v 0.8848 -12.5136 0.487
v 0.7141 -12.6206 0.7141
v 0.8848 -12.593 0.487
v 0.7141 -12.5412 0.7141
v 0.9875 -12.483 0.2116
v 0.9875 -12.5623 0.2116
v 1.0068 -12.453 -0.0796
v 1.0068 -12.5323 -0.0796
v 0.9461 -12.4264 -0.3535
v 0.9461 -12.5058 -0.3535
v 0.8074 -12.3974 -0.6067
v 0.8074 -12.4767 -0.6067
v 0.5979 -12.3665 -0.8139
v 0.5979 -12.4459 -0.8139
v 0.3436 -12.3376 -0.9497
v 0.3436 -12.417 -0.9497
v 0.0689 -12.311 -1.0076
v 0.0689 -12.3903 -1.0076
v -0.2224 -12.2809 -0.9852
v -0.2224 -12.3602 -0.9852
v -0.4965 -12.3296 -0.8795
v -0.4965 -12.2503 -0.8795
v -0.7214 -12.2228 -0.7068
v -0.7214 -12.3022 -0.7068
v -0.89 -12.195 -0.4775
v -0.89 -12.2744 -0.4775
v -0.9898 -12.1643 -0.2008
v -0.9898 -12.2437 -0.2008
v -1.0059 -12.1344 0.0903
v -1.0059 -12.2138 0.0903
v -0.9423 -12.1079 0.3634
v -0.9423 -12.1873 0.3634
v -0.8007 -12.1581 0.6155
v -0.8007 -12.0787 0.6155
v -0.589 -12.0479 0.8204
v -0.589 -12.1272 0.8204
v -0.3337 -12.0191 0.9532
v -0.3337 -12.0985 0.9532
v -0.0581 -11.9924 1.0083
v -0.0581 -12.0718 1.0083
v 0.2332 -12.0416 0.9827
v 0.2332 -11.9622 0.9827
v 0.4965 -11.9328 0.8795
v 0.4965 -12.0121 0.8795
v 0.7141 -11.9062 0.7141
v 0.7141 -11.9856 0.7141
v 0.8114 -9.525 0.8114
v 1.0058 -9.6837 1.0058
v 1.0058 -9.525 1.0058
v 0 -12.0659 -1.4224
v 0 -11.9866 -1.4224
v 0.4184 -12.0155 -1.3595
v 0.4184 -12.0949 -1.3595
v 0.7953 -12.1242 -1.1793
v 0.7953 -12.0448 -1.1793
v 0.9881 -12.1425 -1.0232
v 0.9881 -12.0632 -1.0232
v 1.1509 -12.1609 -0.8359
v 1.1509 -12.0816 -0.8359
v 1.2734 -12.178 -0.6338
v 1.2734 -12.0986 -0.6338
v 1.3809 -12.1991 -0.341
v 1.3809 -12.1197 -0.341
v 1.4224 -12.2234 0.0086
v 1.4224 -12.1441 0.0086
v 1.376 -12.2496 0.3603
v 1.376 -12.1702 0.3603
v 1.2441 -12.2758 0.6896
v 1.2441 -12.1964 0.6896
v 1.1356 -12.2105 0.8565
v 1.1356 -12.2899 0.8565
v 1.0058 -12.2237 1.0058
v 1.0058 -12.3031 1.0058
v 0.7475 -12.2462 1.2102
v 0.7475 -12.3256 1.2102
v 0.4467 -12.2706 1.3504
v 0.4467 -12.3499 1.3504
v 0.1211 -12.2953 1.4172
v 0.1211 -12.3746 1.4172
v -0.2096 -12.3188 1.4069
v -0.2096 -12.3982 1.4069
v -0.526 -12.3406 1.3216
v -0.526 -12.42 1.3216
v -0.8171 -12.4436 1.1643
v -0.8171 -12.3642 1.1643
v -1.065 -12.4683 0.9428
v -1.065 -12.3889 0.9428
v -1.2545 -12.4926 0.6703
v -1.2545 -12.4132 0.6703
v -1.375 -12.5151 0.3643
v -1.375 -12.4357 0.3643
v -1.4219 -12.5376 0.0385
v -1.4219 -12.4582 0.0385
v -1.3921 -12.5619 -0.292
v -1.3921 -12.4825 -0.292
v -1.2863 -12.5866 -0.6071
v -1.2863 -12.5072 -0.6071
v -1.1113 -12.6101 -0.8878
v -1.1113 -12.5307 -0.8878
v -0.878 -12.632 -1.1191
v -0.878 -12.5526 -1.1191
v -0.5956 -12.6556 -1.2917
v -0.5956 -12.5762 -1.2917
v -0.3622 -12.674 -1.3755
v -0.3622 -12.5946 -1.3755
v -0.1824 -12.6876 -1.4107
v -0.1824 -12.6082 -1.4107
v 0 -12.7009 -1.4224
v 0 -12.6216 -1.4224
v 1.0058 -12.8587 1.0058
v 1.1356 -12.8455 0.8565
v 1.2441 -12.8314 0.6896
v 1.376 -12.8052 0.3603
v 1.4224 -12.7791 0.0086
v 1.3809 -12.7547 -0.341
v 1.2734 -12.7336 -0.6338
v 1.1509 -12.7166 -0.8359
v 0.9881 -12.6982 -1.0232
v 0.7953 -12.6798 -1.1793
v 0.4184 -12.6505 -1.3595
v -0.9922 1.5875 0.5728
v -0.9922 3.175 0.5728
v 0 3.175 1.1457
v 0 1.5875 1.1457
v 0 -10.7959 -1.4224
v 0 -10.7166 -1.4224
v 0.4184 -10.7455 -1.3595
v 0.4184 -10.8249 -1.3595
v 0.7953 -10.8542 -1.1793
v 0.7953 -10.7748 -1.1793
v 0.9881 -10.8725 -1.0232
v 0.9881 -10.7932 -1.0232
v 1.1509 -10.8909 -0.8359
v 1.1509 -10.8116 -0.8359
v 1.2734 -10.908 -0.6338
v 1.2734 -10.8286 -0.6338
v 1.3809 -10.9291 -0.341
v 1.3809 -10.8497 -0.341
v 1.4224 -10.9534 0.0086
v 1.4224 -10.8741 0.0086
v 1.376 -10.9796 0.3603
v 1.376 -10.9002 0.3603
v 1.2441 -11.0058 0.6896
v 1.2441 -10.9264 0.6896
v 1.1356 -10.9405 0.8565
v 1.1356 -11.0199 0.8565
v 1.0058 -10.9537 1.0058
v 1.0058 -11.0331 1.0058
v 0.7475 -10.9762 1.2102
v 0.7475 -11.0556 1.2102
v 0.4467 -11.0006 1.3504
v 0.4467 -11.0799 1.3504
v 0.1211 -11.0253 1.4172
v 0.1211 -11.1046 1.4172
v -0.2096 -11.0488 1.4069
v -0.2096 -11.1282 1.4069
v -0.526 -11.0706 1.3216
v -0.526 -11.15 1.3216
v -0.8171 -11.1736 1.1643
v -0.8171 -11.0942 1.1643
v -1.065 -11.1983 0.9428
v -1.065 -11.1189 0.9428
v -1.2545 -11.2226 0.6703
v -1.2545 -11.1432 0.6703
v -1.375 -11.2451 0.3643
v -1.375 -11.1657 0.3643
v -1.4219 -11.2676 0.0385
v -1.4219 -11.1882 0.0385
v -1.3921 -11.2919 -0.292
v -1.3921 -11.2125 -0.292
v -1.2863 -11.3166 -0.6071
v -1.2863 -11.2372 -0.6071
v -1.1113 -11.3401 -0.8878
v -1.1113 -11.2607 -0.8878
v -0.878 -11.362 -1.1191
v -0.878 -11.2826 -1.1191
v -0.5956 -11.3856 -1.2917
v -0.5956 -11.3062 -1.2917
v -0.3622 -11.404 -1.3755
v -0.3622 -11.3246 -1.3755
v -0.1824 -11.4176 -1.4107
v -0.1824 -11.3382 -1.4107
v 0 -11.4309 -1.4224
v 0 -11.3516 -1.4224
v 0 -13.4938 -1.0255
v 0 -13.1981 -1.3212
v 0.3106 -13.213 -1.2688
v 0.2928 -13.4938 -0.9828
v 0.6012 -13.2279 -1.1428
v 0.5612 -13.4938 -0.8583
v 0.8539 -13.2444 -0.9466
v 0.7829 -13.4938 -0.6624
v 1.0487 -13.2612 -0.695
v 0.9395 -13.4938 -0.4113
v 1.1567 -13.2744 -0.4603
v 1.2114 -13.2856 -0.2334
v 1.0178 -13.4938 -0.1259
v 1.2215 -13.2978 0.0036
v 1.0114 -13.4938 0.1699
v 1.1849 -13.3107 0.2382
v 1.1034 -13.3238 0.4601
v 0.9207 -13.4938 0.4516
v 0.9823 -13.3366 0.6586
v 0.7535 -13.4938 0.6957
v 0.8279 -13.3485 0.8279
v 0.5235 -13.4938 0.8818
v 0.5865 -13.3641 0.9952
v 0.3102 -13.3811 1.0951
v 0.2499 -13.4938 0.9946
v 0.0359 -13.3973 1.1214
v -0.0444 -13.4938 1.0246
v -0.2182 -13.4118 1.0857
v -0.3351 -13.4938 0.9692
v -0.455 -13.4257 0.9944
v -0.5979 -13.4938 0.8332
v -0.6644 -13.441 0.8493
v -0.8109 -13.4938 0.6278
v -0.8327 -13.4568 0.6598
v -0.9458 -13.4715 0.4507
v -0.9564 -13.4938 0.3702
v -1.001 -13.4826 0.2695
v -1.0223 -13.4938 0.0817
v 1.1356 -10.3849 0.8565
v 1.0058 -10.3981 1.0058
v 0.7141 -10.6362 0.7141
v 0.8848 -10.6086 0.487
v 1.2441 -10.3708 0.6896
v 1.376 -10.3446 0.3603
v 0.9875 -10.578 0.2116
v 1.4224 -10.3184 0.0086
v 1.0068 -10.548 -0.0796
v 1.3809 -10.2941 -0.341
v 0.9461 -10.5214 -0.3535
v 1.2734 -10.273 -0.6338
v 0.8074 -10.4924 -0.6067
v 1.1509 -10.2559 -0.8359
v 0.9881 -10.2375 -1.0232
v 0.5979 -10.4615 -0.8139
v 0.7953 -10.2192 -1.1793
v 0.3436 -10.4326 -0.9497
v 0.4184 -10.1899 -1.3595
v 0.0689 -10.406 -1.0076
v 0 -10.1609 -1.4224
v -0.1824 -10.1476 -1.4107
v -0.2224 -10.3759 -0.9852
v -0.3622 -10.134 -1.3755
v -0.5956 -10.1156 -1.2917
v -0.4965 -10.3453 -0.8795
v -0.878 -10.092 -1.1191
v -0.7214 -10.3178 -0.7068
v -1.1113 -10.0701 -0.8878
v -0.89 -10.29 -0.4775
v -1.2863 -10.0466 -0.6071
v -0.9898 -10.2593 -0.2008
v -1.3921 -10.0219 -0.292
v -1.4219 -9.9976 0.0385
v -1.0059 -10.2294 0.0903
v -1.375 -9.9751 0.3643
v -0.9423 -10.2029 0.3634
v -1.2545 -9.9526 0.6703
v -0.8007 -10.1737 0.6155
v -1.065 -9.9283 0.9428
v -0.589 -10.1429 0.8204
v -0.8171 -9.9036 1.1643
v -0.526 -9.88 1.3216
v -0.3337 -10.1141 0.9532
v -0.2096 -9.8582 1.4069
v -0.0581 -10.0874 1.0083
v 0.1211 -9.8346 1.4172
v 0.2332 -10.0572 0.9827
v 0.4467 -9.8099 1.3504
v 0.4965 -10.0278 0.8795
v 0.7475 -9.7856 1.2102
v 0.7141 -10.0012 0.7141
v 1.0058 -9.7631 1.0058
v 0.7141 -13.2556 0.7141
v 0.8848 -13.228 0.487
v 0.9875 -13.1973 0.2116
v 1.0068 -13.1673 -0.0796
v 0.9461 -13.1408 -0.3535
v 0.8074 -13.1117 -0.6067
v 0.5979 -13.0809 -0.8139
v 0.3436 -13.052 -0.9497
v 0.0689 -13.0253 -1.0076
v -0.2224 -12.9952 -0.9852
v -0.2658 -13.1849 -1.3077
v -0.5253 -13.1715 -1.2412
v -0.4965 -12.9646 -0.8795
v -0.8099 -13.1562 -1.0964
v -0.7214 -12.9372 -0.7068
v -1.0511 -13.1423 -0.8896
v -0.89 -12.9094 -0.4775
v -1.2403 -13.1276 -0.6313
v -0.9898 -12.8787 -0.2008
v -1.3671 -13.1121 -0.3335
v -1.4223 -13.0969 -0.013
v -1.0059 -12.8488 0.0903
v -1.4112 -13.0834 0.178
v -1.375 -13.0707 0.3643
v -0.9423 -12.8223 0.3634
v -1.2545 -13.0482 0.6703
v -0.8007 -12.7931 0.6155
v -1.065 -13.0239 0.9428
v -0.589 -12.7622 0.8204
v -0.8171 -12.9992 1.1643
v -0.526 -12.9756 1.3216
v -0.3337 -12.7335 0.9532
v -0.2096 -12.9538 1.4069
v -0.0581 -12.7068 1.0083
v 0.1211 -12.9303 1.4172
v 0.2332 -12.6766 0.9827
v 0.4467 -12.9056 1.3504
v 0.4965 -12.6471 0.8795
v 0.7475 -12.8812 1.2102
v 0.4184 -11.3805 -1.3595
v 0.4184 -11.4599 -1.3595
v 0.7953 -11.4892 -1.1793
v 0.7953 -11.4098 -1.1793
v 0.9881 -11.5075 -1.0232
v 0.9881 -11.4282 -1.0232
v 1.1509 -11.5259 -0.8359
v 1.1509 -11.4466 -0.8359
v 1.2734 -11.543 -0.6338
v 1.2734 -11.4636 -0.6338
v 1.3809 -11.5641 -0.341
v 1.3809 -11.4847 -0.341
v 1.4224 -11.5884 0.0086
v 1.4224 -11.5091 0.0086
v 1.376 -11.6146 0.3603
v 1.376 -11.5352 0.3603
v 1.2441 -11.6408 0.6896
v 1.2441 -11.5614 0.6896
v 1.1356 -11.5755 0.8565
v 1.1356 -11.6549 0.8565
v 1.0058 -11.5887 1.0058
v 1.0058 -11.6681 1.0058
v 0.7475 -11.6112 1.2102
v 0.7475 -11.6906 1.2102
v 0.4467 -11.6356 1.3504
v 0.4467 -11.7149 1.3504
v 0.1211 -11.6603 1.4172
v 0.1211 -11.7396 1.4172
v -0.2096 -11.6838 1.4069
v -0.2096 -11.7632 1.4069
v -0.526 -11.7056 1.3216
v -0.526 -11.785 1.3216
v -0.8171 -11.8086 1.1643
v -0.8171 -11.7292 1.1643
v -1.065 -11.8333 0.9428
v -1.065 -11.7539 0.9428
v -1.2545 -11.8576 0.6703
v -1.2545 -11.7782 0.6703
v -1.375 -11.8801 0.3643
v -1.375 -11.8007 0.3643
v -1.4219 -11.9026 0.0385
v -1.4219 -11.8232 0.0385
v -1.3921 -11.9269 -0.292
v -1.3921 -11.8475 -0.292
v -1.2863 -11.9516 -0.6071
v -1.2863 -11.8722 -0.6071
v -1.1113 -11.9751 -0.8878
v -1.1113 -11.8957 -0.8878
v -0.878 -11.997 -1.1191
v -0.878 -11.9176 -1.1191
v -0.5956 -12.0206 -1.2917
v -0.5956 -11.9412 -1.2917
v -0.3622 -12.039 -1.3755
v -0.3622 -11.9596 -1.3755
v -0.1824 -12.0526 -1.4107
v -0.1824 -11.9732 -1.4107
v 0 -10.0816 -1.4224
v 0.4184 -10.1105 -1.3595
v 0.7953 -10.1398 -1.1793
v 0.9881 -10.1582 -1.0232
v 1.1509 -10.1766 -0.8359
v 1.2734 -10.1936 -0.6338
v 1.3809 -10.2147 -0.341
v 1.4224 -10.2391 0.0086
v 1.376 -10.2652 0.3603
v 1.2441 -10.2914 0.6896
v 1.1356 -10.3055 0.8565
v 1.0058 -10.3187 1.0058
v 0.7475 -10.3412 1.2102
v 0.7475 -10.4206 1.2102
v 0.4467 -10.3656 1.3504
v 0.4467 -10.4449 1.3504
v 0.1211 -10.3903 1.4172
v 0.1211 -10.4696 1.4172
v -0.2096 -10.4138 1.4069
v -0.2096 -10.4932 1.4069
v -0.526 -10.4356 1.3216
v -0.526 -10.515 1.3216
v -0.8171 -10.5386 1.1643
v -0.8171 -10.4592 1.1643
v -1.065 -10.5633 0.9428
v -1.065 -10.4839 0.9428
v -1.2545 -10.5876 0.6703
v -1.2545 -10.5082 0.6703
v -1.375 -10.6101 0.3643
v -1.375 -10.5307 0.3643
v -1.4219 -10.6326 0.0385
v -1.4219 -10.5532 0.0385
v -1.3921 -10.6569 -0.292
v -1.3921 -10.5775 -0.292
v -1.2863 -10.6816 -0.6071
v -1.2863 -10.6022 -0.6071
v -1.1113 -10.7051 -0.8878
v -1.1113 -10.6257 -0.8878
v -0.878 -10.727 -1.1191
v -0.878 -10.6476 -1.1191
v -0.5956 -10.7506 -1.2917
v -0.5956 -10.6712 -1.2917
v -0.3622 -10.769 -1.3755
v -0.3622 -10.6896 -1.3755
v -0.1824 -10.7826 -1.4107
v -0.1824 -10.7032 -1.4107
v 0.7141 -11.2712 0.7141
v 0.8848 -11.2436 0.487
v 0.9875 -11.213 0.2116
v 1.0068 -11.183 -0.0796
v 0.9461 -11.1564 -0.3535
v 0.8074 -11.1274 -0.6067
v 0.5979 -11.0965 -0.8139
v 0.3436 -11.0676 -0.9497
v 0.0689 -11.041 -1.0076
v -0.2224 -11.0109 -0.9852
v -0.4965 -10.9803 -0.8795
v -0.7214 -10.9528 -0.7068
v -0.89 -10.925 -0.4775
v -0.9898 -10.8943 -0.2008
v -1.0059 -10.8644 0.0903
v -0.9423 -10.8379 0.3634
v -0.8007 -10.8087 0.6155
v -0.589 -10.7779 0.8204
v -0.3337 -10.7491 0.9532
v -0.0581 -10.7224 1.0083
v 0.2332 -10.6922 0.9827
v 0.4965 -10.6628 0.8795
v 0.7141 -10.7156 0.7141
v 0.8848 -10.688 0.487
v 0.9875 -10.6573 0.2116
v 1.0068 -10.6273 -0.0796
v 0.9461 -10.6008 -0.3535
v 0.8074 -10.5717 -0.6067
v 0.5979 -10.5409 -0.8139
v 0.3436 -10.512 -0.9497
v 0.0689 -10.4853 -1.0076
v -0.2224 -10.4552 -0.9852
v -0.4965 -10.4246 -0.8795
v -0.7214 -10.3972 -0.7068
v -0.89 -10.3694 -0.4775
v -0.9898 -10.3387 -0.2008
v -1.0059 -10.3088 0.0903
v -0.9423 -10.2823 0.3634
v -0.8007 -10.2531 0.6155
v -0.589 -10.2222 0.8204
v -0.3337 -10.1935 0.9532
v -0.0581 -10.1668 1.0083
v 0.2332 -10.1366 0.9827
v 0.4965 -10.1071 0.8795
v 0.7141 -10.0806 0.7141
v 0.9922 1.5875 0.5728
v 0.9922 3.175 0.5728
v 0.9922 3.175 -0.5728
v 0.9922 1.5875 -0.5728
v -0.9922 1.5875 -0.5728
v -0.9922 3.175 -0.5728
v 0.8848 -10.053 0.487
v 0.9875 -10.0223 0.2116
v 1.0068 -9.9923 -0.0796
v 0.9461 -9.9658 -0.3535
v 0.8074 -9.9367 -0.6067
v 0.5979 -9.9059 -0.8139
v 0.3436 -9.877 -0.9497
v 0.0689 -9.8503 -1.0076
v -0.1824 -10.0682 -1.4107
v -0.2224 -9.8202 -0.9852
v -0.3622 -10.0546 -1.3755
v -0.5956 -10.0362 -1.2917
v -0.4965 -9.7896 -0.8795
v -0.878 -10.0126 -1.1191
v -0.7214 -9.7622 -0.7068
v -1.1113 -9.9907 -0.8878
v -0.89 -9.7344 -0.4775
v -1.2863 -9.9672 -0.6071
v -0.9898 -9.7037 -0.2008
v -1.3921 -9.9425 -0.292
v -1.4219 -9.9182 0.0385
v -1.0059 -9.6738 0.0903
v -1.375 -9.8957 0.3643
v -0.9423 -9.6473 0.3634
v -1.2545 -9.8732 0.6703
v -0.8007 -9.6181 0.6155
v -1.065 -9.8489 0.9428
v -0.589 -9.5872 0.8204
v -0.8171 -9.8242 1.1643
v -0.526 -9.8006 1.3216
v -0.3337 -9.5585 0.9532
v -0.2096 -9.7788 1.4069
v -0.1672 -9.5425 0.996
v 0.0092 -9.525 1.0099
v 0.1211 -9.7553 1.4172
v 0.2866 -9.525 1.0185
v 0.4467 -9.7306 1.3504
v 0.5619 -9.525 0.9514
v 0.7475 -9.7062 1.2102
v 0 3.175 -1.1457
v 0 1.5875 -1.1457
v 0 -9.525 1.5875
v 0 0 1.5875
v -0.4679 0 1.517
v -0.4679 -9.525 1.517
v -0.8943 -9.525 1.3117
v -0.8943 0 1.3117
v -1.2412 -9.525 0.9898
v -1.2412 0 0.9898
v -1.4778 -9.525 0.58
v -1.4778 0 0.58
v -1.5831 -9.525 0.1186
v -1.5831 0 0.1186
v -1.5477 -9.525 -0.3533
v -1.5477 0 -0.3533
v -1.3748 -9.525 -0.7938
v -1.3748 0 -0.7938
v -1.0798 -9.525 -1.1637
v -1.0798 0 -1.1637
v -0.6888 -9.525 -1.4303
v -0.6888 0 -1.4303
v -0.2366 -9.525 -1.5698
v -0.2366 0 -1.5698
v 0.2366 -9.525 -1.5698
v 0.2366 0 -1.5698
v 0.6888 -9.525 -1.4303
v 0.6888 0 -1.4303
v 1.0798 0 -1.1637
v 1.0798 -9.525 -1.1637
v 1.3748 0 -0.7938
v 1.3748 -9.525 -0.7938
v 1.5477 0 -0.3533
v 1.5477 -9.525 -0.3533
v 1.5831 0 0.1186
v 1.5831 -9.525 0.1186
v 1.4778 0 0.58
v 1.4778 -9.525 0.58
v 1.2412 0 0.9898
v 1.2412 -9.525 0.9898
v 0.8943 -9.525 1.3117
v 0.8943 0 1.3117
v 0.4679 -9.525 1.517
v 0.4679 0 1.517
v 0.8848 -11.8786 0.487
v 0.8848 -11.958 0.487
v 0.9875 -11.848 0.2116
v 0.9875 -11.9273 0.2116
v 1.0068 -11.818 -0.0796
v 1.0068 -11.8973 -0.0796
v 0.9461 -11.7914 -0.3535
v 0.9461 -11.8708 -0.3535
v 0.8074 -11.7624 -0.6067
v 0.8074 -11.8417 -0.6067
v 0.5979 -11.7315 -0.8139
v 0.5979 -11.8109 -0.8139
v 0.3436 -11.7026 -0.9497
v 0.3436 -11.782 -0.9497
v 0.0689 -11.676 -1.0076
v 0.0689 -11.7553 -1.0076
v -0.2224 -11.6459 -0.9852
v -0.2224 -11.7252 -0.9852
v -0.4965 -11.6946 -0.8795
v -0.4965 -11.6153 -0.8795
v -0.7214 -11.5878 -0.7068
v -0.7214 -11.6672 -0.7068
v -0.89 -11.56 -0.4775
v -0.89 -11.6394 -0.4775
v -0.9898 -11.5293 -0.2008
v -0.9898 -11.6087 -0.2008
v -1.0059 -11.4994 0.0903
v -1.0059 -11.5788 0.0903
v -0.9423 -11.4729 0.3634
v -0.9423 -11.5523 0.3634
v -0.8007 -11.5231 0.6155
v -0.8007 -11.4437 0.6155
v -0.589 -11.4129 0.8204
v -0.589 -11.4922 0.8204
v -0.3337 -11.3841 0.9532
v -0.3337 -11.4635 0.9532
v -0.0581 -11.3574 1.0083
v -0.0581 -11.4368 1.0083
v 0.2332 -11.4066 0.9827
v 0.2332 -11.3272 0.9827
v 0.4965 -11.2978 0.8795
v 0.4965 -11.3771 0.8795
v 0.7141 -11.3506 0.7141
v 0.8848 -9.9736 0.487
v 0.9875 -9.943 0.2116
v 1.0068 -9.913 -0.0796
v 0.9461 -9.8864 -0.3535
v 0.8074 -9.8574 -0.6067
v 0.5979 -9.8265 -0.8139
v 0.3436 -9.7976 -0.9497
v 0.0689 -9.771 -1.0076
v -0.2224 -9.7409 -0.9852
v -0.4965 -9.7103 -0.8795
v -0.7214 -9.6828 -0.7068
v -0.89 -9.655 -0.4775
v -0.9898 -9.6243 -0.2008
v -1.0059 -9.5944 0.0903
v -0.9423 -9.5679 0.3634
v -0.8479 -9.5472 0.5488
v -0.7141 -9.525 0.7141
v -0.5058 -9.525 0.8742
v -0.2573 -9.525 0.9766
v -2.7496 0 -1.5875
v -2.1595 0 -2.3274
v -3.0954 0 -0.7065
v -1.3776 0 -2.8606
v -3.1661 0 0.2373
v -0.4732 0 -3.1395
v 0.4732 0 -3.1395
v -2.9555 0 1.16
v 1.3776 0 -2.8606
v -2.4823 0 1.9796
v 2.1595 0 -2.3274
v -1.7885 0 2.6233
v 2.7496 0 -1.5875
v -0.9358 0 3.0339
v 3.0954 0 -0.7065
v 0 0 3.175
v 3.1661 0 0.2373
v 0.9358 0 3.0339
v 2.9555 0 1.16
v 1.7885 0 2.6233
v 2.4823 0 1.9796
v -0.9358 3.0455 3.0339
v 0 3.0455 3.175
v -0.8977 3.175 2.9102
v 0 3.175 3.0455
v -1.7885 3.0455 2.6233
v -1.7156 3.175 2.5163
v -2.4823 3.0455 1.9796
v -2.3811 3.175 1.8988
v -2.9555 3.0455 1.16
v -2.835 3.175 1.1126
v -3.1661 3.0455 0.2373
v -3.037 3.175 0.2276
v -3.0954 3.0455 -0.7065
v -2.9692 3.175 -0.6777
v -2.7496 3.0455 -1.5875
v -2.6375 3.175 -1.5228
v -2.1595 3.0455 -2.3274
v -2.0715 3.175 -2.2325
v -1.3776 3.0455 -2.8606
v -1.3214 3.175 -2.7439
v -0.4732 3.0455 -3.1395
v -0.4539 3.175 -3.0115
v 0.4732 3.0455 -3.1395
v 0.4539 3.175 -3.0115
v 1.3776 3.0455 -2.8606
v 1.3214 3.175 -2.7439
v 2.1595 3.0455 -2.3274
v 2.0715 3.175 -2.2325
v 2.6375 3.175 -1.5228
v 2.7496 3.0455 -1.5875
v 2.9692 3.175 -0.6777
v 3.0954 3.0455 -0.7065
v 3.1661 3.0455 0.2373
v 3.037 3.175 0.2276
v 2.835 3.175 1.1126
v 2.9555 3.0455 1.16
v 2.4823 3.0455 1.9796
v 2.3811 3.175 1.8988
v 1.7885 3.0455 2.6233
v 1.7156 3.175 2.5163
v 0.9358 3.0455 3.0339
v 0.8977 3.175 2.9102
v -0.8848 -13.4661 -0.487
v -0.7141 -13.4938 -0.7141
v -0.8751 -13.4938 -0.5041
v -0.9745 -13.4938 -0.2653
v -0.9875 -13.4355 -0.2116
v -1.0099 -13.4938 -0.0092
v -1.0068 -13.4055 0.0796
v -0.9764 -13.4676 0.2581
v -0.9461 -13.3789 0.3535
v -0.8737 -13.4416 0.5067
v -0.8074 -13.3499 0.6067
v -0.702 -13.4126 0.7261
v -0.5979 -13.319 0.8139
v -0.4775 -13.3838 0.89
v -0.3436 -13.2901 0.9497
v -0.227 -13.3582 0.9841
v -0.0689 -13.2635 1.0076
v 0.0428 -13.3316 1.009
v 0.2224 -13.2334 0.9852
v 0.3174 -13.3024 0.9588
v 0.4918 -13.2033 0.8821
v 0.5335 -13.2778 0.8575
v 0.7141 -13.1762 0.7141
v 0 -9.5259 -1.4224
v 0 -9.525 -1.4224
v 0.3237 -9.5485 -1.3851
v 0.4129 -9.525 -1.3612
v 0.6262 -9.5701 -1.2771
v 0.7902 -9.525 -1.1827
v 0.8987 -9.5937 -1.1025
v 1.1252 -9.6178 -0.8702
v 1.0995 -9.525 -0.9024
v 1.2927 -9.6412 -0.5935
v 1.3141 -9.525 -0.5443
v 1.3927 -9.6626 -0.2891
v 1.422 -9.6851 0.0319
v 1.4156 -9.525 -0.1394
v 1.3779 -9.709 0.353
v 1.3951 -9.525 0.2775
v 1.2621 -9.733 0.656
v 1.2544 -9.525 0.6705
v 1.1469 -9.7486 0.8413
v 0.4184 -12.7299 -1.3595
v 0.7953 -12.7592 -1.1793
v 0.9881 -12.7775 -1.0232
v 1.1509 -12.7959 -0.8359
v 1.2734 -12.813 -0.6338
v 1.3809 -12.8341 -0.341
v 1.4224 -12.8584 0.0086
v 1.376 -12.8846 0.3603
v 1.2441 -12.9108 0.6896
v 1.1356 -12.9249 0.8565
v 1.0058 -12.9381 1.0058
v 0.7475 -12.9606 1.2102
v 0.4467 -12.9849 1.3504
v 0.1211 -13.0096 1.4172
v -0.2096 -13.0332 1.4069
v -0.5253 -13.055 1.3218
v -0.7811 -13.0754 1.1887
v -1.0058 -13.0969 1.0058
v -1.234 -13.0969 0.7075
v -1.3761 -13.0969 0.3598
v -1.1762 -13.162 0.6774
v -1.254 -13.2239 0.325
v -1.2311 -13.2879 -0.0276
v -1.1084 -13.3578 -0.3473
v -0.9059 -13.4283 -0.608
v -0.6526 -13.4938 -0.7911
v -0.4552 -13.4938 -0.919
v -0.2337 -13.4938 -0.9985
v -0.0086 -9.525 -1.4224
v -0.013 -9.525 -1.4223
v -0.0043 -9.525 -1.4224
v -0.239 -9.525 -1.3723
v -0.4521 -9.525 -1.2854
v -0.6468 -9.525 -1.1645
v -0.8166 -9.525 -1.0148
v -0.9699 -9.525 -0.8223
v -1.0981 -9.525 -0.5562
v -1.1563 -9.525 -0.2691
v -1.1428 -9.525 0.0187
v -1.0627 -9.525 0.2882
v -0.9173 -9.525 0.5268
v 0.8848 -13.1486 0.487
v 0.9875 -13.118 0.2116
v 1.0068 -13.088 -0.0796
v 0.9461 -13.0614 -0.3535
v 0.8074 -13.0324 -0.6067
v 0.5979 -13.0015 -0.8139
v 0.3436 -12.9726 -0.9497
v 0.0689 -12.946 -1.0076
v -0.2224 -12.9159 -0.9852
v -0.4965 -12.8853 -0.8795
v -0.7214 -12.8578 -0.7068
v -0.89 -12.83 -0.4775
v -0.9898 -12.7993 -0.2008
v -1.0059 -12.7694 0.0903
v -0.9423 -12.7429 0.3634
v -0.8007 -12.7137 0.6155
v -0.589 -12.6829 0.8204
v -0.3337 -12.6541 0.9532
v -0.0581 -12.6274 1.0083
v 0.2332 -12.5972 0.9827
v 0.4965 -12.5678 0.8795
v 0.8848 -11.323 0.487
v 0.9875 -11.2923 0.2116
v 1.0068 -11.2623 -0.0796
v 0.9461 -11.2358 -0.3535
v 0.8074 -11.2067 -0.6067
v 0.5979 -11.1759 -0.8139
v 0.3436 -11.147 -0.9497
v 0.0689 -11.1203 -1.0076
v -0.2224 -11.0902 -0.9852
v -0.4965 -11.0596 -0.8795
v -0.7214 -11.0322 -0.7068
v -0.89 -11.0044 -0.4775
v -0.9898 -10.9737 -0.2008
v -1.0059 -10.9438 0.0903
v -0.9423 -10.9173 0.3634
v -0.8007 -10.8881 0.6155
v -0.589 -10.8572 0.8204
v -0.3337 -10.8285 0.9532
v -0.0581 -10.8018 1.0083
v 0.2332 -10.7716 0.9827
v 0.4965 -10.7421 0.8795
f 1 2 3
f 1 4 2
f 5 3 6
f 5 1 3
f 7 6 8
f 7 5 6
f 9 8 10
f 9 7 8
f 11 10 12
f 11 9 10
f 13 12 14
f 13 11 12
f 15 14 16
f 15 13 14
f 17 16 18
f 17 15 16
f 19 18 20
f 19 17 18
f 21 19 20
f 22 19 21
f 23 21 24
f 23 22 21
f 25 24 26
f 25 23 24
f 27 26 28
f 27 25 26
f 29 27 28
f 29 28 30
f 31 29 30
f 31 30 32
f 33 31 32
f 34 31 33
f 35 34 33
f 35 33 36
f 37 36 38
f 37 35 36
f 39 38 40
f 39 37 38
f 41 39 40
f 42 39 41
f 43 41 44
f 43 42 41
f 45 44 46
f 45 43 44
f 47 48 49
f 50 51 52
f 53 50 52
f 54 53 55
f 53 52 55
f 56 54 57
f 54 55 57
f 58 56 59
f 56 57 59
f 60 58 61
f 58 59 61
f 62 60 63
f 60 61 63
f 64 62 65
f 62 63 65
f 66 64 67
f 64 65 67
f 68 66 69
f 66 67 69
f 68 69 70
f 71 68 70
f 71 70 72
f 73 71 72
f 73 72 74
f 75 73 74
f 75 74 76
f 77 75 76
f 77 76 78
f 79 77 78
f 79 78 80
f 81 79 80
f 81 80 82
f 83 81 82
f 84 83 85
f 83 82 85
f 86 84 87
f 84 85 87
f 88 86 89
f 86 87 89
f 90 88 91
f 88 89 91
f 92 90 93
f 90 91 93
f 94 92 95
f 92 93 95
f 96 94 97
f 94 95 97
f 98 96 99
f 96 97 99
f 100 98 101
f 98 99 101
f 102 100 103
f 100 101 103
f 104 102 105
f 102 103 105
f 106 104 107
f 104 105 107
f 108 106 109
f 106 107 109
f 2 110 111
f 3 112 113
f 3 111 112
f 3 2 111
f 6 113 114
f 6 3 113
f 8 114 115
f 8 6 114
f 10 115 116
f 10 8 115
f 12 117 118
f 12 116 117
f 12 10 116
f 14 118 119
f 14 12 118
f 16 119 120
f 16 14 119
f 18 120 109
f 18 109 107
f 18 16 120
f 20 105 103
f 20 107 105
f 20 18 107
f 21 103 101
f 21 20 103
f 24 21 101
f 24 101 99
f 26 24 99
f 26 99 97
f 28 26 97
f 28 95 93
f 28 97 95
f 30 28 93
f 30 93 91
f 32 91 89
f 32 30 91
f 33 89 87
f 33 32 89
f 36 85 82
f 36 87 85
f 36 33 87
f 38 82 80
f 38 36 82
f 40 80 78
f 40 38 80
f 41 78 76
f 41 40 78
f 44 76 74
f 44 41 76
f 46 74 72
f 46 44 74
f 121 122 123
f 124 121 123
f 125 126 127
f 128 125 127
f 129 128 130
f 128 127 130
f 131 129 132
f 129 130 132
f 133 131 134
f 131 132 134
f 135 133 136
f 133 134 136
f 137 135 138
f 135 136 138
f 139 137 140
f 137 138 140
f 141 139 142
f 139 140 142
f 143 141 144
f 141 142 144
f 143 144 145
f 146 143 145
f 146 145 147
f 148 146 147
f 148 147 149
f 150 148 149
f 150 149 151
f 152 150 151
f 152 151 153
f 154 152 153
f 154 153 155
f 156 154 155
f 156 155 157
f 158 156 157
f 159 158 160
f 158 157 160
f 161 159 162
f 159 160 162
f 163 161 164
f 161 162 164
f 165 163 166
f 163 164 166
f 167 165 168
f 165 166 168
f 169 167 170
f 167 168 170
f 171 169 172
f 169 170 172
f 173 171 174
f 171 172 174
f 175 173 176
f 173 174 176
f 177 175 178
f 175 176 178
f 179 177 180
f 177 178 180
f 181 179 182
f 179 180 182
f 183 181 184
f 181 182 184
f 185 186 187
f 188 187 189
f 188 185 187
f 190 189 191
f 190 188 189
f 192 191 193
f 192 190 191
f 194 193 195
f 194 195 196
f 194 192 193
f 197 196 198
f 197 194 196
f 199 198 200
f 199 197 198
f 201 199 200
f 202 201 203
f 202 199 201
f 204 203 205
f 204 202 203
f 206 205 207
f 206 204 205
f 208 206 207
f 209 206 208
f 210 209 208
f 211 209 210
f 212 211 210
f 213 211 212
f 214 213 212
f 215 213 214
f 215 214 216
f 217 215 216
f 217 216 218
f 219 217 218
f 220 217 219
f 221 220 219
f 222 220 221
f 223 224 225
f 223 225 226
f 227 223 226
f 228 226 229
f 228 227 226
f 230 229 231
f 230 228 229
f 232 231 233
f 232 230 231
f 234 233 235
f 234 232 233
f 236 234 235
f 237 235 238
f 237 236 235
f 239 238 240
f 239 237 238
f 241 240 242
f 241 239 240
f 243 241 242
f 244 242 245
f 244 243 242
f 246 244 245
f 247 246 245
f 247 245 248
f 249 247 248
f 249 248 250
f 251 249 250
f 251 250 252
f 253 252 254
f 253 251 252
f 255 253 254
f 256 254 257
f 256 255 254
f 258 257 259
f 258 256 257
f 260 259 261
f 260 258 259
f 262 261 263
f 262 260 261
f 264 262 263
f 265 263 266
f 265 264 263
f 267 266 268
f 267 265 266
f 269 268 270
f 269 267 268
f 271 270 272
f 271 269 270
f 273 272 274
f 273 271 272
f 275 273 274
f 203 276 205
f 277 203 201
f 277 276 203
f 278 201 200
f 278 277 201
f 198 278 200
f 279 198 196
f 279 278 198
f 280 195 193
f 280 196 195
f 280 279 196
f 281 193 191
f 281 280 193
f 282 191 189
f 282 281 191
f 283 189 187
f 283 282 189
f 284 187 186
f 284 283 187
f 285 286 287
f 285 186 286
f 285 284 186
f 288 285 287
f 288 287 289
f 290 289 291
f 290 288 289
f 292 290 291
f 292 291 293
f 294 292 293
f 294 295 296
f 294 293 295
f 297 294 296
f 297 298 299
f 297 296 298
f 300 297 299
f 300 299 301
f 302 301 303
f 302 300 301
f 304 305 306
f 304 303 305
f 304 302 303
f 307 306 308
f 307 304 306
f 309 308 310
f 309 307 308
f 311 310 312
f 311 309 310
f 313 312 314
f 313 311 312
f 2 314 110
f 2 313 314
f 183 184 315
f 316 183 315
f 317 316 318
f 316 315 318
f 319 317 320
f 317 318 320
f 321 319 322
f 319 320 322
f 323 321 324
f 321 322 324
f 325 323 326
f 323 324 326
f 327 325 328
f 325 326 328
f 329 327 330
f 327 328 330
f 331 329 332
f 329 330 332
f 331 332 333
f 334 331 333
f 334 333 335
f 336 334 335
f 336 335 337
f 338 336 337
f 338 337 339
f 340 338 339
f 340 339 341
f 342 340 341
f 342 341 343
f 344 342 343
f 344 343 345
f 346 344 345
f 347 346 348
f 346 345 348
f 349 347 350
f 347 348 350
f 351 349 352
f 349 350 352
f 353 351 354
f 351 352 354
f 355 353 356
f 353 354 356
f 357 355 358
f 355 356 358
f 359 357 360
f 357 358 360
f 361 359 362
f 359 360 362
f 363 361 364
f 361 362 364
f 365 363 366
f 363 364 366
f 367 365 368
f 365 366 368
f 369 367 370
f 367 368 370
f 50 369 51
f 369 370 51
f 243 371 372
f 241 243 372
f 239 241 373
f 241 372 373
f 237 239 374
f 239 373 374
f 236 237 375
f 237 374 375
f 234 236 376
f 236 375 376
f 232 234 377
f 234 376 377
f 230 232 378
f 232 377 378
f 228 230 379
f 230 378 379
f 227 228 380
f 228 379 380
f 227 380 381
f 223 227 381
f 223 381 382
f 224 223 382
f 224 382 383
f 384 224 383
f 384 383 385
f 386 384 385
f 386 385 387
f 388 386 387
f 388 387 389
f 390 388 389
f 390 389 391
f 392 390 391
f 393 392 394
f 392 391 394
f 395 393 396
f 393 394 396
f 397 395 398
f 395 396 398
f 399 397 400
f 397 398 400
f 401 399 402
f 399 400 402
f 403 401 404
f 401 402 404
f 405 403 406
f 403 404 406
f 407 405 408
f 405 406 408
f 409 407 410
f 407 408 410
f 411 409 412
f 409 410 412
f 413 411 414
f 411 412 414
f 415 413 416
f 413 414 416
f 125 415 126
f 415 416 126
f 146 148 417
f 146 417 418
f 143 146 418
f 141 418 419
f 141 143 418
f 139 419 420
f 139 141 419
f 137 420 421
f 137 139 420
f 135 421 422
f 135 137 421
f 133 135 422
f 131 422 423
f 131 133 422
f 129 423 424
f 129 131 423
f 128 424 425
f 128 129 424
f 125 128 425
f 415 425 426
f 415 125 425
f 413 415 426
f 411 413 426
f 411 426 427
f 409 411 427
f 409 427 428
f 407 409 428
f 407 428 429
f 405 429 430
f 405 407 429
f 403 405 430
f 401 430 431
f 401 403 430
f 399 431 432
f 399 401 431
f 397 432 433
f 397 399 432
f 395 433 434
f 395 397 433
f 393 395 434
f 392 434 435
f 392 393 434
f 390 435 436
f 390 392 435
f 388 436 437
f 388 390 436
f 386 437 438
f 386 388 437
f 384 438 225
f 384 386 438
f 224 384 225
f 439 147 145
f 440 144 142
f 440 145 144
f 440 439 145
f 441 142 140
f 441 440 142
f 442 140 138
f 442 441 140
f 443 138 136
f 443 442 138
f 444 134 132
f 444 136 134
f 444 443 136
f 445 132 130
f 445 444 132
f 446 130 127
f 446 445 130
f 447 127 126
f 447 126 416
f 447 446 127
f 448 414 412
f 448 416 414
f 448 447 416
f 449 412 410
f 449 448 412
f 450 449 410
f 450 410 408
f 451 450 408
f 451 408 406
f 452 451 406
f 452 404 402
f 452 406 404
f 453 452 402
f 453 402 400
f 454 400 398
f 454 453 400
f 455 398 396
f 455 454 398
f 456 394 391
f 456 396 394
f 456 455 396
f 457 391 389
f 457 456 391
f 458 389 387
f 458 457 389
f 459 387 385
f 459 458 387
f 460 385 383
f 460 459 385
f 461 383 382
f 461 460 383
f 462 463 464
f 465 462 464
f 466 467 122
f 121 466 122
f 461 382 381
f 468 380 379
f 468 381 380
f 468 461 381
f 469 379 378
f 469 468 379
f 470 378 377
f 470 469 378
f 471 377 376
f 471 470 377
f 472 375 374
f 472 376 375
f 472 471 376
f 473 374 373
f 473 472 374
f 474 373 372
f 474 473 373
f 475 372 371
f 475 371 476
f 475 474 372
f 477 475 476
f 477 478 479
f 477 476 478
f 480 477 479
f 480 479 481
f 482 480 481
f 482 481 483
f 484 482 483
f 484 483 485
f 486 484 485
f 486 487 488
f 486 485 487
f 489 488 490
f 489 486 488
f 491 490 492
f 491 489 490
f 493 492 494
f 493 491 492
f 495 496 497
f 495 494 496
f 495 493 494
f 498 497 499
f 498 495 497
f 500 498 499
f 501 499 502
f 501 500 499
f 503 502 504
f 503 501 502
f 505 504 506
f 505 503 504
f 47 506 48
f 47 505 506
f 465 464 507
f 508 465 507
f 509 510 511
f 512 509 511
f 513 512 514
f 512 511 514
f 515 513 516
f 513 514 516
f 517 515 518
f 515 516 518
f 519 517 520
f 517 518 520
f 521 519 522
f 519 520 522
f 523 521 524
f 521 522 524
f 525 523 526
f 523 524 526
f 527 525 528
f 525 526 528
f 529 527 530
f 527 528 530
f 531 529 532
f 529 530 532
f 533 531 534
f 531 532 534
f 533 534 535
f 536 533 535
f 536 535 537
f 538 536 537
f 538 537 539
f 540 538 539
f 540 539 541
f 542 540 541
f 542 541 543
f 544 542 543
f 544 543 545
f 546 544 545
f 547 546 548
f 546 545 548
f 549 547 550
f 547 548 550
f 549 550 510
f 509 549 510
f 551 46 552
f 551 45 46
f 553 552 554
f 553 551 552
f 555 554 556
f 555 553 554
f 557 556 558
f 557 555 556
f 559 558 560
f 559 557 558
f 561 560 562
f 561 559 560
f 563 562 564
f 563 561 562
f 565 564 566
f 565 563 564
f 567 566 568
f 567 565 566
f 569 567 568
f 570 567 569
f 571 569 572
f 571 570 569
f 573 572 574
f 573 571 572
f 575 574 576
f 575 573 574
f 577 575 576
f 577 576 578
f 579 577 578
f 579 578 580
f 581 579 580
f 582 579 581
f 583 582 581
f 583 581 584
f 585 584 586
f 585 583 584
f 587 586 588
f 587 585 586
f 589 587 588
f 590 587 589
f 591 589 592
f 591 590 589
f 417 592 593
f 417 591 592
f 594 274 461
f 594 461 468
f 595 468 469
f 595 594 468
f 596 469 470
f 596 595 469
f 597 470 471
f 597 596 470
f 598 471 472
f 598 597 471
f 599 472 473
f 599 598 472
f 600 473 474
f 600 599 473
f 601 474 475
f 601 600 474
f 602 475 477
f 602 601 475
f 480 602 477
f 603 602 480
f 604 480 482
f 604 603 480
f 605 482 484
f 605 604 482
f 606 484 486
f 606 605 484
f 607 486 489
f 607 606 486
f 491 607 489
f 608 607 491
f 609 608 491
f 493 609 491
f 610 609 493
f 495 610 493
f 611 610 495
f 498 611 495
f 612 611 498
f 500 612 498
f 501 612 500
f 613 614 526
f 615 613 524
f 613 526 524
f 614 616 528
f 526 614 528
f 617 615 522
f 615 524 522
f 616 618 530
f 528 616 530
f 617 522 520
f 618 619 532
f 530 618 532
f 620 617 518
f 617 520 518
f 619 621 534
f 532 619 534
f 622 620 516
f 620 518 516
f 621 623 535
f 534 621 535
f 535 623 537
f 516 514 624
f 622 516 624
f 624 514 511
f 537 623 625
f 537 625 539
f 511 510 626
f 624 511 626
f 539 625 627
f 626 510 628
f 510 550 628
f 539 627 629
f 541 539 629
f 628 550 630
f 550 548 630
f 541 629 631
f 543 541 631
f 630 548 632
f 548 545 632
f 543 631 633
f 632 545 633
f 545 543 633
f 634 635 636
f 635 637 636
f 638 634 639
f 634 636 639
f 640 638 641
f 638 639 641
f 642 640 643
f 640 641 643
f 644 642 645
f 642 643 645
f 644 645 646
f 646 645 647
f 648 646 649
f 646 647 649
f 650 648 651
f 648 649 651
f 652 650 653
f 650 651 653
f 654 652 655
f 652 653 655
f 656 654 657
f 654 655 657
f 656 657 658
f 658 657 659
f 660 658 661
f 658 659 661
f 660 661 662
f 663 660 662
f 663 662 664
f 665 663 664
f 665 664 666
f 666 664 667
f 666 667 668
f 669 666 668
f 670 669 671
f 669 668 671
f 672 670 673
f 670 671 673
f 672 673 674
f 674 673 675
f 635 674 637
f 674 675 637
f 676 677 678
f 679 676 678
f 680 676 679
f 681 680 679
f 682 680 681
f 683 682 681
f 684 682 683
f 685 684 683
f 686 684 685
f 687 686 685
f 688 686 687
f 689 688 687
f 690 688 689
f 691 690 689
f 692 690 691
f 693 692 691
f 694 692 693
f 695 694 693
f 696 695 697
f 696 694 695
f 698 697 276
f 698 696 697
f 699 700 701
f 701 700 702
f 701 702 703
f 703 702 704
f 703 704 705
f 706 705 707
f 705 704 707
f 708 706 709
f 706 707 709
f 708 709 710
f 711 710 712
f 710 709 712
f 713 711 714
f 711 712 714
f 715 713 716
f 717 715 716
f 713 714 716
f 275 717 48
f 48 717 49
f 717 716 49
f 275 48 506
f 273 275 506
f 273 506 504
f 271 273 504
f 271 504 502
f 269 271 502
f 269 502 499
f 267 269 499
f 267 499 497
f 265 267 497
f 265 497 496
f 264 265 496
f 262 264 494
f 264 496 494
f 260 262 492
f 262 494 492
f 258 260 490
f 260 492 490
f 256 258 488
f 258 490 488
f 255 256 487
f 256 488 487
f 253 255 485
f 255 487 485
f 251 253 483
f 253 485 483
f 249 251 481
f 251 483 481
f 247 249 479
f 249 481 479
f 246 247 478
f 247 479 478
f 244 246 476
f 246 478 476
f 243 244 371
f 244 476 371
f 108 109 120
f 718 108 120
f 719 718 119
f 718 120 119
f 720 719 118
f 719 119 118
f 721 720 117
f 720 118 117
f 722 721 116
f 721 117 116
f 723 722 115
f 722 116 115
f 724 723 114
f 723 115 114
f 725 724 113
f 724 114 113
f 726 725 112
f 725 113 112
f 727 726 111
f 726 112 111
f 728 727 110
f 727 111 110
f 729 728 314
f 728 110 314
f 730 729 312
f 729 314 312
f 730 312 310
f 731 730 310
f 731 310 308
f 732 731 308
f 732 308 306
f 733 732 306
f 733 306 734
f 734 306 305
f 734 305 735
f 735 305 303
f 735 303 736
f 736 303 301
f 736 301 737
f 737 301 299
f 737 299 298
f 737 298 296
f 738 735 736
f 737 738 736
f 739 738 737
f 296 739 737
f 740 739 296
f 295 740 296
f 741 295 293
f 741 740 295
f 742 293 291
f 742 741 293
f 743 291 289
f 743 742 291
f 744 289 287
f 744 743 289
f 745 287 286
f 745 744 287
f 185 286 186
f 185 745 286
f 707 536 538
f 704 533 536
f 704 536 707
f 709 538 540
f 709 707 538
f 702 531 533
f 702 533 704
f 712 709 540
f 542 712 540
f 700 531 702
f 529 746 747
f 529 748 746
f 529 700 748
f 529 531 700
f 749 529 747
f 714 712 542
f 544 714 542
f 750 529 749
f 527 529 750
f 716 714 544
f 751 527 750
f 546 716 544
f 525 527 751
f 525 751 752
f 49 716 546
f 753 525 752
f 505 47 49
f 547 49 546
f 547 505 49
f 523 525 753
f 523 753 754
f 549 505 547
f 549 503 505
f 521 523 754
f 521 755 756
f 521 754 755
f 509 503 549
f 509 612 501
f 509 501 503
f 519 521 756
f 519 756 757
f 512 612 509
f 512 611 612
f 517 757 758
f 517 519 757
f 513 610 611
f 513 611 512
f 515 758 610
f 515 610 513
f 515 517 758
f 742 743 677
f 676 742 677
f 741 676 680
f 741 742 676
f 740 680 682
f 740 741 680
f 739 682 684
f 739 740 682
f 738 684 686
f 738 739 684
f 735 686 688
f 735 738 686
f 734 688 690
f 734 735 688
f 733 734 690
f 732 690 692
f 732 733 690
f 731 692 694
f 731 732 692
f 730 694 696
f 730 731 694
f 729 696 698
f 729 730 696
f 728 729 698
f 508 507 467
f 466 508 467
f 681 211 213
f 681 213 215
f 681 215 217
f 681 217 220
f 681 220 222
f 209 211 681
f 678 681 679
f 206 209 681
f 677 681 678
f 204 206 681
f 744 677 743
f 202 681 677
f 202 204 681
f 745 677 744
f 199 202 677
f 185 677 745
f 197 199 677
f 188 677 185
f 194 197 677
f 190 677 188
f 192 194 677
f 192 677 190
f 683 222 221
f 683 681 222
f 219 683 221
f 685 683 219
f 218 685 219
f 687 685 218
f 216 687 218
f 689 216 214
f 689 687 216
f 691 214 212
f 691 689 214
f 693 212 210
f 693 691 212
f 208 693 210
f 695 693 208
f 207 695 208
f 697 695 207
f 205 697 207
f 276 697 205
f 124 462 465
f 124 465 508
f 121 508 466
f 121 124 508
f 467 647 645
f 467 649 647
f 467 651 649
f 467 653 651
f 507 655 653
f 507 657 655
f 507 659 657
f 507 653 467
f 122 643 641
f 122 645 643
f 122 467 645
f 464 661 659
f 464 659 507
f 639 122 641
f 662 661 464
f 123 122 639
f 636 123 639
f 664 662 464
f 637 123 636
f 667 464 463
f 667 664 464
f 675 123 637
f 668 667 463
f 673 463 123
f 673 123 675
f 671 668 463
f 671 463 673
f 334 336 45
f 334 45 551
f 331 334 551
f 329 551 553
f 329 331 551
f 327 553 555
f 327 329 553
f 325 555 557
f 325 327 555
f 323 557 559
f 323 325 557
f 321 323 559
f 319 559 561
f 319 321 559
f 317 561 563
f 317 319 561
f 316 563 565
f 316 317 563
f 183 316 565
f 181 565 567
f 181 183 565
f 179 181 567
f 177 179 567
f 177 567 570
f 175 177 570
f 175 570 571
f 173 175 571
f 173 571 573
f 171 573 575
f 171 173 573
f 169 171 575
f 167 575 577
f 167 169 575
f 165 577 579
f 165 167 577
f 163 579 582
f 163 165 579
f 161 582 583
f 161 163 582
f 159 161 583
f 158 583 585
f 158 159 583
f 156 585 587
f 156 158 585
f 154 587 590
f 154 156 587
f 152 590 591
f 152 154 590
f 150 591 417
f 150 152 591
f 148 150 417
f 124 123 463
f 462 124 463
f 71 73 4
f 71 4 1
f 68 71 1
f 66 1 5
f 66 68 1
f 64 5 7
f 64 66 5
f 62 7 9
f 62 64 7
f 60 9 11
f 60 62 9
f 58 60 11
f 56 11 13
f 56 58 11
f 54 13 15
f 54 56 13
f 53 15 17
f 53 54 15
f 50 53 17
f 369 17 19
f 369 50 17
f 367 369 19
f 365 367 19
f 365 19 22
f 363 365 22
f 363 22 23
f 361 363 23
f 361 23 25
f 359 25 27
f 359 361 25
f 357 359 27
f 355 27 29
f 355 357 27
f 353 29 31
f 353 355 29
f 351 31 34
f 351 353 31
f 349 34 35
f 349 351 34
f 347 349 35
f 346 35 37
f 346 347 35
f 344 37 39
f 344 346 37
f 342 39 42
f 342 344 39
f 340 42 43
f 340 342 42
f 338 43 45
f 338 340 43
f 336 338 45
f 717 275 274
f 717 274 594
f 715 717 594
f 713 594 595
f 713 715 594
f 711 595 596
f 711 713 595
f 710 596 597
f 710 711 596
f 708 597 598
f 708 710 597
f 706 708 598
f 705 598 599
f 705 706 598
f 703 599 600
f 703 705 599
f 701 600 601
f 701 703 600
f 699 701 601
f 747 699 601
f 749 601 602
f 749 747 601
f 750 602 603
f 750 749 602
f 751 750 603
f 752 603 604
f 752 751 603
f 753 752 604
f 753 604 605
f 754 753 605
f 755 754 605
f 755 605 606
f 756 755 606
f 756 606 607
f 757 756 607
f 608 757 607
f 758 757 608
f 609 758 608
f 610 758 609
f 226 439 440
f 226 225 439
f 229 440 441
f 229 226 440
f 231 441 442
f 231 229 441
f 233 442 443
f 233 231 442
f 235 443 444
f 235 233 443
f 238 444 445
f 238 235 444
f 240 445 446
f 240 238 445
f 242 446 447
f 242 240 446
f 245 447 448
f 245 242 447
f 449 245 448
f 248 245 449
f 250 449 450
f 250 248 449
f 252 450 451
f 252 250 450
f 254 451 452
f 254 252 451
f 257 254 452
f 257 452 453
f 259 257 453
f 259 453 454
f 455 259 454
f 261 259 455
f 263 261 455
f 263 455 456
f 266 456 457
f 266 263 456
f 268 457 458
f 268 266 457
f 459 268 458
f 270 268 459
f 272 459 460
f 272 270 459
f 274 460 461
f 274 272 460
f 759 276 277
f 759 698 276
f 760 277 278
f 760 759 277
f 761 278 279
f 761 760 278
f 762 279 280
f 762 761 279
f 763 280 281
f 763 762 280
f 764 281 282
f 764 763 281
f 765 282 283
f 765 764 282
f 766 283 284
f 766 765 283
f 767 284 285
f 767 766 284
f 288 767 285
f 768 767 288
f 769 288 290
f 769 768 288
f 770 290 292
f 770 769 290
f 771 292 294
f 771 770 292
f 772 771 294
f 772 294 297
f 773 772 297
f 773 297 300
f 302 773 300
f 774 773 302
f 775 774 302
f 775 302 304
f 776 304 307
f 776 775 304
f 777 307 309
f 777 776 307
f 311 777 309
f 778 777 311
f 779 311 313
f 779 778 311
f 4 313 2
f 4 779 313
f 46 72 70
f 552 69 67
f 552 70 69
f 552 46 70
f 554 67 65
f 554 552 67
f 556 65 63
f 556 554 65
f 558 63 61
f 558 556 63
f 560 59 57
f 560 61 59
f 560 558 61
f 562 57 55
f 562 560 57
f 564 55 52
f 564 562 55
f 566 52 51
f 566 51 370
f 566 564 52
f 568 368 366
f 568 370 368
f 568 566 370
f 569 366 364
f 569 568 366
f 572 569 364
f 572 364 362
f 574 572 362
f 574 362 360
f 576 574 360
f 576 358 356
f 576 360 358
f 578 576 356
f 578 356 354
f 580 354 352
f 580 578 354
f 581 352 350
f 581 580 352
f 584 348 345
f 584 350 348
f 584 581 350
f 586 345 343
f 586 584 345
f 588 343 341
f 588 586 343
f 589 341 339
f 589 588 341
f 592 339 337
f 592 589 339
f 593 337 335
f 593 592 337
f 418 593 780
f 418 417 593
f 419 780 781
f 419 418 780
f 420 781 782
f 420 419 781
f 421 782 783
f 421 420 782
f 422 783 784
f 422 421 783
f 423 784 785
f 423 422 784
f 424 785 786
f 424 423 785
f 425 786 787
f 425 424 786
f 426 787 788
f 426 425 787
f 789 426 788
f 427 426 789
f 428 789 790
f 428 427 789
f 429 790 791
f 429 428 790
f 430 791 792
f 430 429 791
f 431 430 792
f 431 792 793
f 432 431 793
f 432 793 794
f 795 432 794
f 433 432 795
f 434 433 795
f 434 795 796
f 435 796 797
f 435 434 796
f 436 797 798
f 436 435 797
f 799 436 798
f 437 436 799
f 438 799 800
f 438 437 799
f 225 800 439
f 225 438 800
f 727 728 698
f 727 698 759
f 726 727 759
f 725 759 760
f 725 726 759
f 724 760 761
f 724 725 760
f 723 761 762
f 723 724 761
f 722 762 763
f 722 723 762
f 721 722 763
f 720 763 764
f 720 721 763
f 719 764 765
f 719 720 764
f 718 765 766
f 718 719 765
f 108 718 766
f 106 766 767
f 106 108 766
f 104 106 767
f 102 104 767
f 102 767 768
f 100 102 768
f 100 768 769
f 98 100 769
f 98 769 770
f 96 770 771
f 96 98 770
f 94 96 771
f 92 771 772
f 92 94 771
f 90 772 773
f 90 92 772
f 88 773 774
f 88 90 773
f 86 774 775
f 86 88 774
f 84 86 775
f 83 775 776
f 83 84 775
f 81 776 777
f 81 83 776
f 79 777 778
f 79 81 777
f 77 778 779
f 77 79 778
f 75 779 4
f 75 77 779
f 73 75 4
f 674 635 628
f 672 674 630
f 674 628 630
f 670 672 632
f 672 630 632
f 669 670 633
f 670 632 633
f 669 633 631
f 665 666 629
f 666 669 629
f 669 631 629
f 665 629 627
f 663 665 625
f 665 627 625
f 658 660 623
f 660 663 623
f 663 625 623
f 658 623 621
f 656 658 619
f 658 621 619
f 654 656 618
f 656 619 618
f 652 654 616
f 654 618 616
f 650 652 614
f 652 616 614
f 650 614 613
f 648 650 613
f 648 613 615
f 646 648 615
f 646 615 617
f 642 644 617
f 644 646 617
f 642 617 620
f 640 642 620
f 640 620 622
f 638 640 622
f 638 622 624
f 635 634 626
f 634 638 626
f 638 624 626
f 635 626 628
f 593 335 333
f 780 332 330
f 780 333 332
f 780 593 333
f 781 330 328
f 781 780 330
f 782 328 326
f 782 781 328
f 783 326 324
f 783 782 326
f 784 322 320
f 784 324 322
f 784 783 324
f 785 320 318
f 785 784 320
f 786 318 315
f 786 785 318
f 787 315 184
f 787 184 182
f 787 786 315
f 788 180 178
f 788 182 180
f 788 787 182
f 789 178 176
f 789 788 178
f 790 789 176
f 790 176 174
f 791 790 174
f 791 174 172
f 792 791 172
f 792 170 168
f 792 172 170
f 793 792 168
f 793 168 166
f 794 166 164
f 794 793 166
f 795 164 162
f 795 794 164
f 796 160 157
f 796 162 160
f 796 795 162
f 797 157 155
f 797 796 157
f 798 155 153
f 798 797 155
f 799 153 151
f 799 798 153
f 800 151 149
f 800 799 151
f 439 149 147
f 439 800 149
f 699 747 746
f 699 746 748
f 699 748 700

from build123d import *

# Parameters (mm, degrees)
SKETCH1_R          = 3.175
EXTRUDE1_DEPTH     = 3.175
CUT_EXTRUDE1_DEPTH = 1.5875
SKETCH4_R          = 1.5875
EXTRUDE2_DEPTH     = 9.525
SKETCH5_R          = 1.4224
EXTRUDE3_DEPTH     = 3.96875
CHAMFER1_SIZE      = 0.396875
CUT_SWEEP1_PITCH   = 0.635
CUT_SWEEP1_TO      = 3.96875


with BuildPart() as part:
    # Sketch1 → Extrude1 (new body)
    with BuildSketch(Plane(origin=(0, 0, 0), x_dir=(1, 0, 0), z_dir=(0, 1, 0))):
        with Locations(Location((0, 0, 0), (0, 0, 270))):
            Circle(SKETCH1_R)
    extrude(amount=EXTRUDE1_DEPTH)

    # Sketch2 → Cut-Extrude1 (cut)
    with BuildSketch(Plane(origin=(0, 3.175, 0), x_dir=(-1, 0, 0), z_dir=(0, 1, 0))):
        Polygon((0, -1.14567944), (0.9921875, -0.57283972), (0.9921875, 0.57283972), (0, 1.14567944), (-0.9921875, 0.57283972), (-0.9921875, -0.57283972), align=None)
    extrude(amount=-CUT_EXTRUDE1_DEPTH, mode=Mode.SUBTRACT)

    # Sketch4 → Extrude2 (add)
    with BuildSketch(Plane.XZ):
        with Locations(Location((0, 0, 0), (0, 0, 90))):
            Circle(SKETCH4_R)
    extrude(amount=EXTRUDE2_DEPTH)

    # Sketch5 → Extrude3 (add)
    with BuildSketch(Plane.XZ.offset(9.525)):
        with Locations(Location((0, 0, 0), (0, 0, 270))):
            Circle(SKETCH5_R)
    extrude(amount=EXTRUDE3_DEPTH)

    # Chamfer1
    chamfer1_edges = [part.edges().sort_by_distance(p)[0] for p in [
        (0, -13.49375, 1.4224),
    ]]
    chamfer(chamfer1_edges, length=CHAMFER1_SIZE)

    # Cut-Sweep1: arcs per turn and ends read off the stored shape
    # Cut-Sweep1: the profile of Sketch13 profile screwed along a right-hand helix through 7 turns, 6 arcs to a turn; built about Z, then put on its axis
    cut_sweep1_z = Axis((0, 0, 0), (0, 0, 1))
    cut_sweep1_corners = [(1.4227, 0, -0.079201795), (1.4227, 0, -0.635173205), (1.009955401, 0, -0.396875), (1.009955401, 0, -0.3175)]
    with BuildLine(mode=Mode.PRIVATE) as cut_sweep1_profile:
        Line(cut_sweep1_corners[0], cut_sweep1_corners[1])
        Line(cut_sweep1_corners[1], cut_sweep1_corners[2])
        Line(cut_sweep1_corners[2], cut_sweep1_corners[3])
        Line(cut_sweep1_corners[3], cut_sweep1_corners[0])
    cut_sweep1_cap = Face(cut_sweep1_profile.wire())
    cut_sweep1_turn_angles = [0, 30, 60, 90, 120, 150, 180, 210, 240, 270, 300, 330, 360]
    cut_sweep1_turn_weights = [1, 0.8660254037844387, 1, 0.8660254037844387, 1, 0.8660254037844387, 1, 0.8660254037844387, 1, 0.8660254037844387, 1, 0.8660254037844387, 1]
    cut_sweep1_turn_rails = [Edge.make_bspline([Vector(p[0], p[1], 0).rotate(cut_sweep1_z, cut_sweep1_turn_angles[k]) / cut_sweep1_turn_weights[k] + Vector(0, 0, p[2] + CUT_SWEEP1_PITCH * cut_sweep1_turn_angles[k] / 360) for k in range(13)], [0, 0, 0, 1, 1, 2, 2, 3, 3, 4, 4, 5, 5, 6, 6, 6], 2, cut_sweep1_turn_weights) for p in cut_sweep1_corners]
    cut_sweep1_turn_sides = [Face.make_surface_from_curves(cut_sweep1_turn_rails[p[0]], cut_sweep1_turn_rails[p[1]]) for p in [(0, 1), (1, 2), (2, 3), (3, 0)]]
    cut_sweep1 = Plane(origin=(0, -13.49375, 0), x_dir=(0.7071067811865438, 0, 0.7071067811865512), z_dir=(0, 1, 0)) * split(Solid(Shell([*[p.moved(Location((0, 0, CUT_SWEEP1_PITCH * i))) for i in range(7) for p in cut_sweep1_turn_sides], cut_sweep1_cap, cut_sweep1_cap.rotate(cut_sweep1_z, 2520).moved(Location((0, 0, CUT_SWEEP1_PITCH * 2520 / 360)))])), bisect_by=Plane.XY.offset(CUT_SWEEP1_TO), keep=Keep.BOTTOM, mode=Mode.PRIVATE)
    add(cut_sweep1, mode=Mode.SUBTRACT)

    # Sketch11 → Cut-Revolve7 (revolve, cut)
    with BuildSketch(Plane.XY, mode=Mode.PRIVATE) as cut_revolve7_sk:
        Polygon((3.175, 3.045510577), (3.045510577, 3.175), (3.175, 3.175), align=None)
    revolve(cut_revolve7_sk.sketch.rotate(Axis((0, 14.544175091, 0), (0, -1, 0)), 90), axis=Axis((0, 14.544175091, 0), (0, -1, 0)), mode=Mode.SUBTRACT)


solid = part.part
